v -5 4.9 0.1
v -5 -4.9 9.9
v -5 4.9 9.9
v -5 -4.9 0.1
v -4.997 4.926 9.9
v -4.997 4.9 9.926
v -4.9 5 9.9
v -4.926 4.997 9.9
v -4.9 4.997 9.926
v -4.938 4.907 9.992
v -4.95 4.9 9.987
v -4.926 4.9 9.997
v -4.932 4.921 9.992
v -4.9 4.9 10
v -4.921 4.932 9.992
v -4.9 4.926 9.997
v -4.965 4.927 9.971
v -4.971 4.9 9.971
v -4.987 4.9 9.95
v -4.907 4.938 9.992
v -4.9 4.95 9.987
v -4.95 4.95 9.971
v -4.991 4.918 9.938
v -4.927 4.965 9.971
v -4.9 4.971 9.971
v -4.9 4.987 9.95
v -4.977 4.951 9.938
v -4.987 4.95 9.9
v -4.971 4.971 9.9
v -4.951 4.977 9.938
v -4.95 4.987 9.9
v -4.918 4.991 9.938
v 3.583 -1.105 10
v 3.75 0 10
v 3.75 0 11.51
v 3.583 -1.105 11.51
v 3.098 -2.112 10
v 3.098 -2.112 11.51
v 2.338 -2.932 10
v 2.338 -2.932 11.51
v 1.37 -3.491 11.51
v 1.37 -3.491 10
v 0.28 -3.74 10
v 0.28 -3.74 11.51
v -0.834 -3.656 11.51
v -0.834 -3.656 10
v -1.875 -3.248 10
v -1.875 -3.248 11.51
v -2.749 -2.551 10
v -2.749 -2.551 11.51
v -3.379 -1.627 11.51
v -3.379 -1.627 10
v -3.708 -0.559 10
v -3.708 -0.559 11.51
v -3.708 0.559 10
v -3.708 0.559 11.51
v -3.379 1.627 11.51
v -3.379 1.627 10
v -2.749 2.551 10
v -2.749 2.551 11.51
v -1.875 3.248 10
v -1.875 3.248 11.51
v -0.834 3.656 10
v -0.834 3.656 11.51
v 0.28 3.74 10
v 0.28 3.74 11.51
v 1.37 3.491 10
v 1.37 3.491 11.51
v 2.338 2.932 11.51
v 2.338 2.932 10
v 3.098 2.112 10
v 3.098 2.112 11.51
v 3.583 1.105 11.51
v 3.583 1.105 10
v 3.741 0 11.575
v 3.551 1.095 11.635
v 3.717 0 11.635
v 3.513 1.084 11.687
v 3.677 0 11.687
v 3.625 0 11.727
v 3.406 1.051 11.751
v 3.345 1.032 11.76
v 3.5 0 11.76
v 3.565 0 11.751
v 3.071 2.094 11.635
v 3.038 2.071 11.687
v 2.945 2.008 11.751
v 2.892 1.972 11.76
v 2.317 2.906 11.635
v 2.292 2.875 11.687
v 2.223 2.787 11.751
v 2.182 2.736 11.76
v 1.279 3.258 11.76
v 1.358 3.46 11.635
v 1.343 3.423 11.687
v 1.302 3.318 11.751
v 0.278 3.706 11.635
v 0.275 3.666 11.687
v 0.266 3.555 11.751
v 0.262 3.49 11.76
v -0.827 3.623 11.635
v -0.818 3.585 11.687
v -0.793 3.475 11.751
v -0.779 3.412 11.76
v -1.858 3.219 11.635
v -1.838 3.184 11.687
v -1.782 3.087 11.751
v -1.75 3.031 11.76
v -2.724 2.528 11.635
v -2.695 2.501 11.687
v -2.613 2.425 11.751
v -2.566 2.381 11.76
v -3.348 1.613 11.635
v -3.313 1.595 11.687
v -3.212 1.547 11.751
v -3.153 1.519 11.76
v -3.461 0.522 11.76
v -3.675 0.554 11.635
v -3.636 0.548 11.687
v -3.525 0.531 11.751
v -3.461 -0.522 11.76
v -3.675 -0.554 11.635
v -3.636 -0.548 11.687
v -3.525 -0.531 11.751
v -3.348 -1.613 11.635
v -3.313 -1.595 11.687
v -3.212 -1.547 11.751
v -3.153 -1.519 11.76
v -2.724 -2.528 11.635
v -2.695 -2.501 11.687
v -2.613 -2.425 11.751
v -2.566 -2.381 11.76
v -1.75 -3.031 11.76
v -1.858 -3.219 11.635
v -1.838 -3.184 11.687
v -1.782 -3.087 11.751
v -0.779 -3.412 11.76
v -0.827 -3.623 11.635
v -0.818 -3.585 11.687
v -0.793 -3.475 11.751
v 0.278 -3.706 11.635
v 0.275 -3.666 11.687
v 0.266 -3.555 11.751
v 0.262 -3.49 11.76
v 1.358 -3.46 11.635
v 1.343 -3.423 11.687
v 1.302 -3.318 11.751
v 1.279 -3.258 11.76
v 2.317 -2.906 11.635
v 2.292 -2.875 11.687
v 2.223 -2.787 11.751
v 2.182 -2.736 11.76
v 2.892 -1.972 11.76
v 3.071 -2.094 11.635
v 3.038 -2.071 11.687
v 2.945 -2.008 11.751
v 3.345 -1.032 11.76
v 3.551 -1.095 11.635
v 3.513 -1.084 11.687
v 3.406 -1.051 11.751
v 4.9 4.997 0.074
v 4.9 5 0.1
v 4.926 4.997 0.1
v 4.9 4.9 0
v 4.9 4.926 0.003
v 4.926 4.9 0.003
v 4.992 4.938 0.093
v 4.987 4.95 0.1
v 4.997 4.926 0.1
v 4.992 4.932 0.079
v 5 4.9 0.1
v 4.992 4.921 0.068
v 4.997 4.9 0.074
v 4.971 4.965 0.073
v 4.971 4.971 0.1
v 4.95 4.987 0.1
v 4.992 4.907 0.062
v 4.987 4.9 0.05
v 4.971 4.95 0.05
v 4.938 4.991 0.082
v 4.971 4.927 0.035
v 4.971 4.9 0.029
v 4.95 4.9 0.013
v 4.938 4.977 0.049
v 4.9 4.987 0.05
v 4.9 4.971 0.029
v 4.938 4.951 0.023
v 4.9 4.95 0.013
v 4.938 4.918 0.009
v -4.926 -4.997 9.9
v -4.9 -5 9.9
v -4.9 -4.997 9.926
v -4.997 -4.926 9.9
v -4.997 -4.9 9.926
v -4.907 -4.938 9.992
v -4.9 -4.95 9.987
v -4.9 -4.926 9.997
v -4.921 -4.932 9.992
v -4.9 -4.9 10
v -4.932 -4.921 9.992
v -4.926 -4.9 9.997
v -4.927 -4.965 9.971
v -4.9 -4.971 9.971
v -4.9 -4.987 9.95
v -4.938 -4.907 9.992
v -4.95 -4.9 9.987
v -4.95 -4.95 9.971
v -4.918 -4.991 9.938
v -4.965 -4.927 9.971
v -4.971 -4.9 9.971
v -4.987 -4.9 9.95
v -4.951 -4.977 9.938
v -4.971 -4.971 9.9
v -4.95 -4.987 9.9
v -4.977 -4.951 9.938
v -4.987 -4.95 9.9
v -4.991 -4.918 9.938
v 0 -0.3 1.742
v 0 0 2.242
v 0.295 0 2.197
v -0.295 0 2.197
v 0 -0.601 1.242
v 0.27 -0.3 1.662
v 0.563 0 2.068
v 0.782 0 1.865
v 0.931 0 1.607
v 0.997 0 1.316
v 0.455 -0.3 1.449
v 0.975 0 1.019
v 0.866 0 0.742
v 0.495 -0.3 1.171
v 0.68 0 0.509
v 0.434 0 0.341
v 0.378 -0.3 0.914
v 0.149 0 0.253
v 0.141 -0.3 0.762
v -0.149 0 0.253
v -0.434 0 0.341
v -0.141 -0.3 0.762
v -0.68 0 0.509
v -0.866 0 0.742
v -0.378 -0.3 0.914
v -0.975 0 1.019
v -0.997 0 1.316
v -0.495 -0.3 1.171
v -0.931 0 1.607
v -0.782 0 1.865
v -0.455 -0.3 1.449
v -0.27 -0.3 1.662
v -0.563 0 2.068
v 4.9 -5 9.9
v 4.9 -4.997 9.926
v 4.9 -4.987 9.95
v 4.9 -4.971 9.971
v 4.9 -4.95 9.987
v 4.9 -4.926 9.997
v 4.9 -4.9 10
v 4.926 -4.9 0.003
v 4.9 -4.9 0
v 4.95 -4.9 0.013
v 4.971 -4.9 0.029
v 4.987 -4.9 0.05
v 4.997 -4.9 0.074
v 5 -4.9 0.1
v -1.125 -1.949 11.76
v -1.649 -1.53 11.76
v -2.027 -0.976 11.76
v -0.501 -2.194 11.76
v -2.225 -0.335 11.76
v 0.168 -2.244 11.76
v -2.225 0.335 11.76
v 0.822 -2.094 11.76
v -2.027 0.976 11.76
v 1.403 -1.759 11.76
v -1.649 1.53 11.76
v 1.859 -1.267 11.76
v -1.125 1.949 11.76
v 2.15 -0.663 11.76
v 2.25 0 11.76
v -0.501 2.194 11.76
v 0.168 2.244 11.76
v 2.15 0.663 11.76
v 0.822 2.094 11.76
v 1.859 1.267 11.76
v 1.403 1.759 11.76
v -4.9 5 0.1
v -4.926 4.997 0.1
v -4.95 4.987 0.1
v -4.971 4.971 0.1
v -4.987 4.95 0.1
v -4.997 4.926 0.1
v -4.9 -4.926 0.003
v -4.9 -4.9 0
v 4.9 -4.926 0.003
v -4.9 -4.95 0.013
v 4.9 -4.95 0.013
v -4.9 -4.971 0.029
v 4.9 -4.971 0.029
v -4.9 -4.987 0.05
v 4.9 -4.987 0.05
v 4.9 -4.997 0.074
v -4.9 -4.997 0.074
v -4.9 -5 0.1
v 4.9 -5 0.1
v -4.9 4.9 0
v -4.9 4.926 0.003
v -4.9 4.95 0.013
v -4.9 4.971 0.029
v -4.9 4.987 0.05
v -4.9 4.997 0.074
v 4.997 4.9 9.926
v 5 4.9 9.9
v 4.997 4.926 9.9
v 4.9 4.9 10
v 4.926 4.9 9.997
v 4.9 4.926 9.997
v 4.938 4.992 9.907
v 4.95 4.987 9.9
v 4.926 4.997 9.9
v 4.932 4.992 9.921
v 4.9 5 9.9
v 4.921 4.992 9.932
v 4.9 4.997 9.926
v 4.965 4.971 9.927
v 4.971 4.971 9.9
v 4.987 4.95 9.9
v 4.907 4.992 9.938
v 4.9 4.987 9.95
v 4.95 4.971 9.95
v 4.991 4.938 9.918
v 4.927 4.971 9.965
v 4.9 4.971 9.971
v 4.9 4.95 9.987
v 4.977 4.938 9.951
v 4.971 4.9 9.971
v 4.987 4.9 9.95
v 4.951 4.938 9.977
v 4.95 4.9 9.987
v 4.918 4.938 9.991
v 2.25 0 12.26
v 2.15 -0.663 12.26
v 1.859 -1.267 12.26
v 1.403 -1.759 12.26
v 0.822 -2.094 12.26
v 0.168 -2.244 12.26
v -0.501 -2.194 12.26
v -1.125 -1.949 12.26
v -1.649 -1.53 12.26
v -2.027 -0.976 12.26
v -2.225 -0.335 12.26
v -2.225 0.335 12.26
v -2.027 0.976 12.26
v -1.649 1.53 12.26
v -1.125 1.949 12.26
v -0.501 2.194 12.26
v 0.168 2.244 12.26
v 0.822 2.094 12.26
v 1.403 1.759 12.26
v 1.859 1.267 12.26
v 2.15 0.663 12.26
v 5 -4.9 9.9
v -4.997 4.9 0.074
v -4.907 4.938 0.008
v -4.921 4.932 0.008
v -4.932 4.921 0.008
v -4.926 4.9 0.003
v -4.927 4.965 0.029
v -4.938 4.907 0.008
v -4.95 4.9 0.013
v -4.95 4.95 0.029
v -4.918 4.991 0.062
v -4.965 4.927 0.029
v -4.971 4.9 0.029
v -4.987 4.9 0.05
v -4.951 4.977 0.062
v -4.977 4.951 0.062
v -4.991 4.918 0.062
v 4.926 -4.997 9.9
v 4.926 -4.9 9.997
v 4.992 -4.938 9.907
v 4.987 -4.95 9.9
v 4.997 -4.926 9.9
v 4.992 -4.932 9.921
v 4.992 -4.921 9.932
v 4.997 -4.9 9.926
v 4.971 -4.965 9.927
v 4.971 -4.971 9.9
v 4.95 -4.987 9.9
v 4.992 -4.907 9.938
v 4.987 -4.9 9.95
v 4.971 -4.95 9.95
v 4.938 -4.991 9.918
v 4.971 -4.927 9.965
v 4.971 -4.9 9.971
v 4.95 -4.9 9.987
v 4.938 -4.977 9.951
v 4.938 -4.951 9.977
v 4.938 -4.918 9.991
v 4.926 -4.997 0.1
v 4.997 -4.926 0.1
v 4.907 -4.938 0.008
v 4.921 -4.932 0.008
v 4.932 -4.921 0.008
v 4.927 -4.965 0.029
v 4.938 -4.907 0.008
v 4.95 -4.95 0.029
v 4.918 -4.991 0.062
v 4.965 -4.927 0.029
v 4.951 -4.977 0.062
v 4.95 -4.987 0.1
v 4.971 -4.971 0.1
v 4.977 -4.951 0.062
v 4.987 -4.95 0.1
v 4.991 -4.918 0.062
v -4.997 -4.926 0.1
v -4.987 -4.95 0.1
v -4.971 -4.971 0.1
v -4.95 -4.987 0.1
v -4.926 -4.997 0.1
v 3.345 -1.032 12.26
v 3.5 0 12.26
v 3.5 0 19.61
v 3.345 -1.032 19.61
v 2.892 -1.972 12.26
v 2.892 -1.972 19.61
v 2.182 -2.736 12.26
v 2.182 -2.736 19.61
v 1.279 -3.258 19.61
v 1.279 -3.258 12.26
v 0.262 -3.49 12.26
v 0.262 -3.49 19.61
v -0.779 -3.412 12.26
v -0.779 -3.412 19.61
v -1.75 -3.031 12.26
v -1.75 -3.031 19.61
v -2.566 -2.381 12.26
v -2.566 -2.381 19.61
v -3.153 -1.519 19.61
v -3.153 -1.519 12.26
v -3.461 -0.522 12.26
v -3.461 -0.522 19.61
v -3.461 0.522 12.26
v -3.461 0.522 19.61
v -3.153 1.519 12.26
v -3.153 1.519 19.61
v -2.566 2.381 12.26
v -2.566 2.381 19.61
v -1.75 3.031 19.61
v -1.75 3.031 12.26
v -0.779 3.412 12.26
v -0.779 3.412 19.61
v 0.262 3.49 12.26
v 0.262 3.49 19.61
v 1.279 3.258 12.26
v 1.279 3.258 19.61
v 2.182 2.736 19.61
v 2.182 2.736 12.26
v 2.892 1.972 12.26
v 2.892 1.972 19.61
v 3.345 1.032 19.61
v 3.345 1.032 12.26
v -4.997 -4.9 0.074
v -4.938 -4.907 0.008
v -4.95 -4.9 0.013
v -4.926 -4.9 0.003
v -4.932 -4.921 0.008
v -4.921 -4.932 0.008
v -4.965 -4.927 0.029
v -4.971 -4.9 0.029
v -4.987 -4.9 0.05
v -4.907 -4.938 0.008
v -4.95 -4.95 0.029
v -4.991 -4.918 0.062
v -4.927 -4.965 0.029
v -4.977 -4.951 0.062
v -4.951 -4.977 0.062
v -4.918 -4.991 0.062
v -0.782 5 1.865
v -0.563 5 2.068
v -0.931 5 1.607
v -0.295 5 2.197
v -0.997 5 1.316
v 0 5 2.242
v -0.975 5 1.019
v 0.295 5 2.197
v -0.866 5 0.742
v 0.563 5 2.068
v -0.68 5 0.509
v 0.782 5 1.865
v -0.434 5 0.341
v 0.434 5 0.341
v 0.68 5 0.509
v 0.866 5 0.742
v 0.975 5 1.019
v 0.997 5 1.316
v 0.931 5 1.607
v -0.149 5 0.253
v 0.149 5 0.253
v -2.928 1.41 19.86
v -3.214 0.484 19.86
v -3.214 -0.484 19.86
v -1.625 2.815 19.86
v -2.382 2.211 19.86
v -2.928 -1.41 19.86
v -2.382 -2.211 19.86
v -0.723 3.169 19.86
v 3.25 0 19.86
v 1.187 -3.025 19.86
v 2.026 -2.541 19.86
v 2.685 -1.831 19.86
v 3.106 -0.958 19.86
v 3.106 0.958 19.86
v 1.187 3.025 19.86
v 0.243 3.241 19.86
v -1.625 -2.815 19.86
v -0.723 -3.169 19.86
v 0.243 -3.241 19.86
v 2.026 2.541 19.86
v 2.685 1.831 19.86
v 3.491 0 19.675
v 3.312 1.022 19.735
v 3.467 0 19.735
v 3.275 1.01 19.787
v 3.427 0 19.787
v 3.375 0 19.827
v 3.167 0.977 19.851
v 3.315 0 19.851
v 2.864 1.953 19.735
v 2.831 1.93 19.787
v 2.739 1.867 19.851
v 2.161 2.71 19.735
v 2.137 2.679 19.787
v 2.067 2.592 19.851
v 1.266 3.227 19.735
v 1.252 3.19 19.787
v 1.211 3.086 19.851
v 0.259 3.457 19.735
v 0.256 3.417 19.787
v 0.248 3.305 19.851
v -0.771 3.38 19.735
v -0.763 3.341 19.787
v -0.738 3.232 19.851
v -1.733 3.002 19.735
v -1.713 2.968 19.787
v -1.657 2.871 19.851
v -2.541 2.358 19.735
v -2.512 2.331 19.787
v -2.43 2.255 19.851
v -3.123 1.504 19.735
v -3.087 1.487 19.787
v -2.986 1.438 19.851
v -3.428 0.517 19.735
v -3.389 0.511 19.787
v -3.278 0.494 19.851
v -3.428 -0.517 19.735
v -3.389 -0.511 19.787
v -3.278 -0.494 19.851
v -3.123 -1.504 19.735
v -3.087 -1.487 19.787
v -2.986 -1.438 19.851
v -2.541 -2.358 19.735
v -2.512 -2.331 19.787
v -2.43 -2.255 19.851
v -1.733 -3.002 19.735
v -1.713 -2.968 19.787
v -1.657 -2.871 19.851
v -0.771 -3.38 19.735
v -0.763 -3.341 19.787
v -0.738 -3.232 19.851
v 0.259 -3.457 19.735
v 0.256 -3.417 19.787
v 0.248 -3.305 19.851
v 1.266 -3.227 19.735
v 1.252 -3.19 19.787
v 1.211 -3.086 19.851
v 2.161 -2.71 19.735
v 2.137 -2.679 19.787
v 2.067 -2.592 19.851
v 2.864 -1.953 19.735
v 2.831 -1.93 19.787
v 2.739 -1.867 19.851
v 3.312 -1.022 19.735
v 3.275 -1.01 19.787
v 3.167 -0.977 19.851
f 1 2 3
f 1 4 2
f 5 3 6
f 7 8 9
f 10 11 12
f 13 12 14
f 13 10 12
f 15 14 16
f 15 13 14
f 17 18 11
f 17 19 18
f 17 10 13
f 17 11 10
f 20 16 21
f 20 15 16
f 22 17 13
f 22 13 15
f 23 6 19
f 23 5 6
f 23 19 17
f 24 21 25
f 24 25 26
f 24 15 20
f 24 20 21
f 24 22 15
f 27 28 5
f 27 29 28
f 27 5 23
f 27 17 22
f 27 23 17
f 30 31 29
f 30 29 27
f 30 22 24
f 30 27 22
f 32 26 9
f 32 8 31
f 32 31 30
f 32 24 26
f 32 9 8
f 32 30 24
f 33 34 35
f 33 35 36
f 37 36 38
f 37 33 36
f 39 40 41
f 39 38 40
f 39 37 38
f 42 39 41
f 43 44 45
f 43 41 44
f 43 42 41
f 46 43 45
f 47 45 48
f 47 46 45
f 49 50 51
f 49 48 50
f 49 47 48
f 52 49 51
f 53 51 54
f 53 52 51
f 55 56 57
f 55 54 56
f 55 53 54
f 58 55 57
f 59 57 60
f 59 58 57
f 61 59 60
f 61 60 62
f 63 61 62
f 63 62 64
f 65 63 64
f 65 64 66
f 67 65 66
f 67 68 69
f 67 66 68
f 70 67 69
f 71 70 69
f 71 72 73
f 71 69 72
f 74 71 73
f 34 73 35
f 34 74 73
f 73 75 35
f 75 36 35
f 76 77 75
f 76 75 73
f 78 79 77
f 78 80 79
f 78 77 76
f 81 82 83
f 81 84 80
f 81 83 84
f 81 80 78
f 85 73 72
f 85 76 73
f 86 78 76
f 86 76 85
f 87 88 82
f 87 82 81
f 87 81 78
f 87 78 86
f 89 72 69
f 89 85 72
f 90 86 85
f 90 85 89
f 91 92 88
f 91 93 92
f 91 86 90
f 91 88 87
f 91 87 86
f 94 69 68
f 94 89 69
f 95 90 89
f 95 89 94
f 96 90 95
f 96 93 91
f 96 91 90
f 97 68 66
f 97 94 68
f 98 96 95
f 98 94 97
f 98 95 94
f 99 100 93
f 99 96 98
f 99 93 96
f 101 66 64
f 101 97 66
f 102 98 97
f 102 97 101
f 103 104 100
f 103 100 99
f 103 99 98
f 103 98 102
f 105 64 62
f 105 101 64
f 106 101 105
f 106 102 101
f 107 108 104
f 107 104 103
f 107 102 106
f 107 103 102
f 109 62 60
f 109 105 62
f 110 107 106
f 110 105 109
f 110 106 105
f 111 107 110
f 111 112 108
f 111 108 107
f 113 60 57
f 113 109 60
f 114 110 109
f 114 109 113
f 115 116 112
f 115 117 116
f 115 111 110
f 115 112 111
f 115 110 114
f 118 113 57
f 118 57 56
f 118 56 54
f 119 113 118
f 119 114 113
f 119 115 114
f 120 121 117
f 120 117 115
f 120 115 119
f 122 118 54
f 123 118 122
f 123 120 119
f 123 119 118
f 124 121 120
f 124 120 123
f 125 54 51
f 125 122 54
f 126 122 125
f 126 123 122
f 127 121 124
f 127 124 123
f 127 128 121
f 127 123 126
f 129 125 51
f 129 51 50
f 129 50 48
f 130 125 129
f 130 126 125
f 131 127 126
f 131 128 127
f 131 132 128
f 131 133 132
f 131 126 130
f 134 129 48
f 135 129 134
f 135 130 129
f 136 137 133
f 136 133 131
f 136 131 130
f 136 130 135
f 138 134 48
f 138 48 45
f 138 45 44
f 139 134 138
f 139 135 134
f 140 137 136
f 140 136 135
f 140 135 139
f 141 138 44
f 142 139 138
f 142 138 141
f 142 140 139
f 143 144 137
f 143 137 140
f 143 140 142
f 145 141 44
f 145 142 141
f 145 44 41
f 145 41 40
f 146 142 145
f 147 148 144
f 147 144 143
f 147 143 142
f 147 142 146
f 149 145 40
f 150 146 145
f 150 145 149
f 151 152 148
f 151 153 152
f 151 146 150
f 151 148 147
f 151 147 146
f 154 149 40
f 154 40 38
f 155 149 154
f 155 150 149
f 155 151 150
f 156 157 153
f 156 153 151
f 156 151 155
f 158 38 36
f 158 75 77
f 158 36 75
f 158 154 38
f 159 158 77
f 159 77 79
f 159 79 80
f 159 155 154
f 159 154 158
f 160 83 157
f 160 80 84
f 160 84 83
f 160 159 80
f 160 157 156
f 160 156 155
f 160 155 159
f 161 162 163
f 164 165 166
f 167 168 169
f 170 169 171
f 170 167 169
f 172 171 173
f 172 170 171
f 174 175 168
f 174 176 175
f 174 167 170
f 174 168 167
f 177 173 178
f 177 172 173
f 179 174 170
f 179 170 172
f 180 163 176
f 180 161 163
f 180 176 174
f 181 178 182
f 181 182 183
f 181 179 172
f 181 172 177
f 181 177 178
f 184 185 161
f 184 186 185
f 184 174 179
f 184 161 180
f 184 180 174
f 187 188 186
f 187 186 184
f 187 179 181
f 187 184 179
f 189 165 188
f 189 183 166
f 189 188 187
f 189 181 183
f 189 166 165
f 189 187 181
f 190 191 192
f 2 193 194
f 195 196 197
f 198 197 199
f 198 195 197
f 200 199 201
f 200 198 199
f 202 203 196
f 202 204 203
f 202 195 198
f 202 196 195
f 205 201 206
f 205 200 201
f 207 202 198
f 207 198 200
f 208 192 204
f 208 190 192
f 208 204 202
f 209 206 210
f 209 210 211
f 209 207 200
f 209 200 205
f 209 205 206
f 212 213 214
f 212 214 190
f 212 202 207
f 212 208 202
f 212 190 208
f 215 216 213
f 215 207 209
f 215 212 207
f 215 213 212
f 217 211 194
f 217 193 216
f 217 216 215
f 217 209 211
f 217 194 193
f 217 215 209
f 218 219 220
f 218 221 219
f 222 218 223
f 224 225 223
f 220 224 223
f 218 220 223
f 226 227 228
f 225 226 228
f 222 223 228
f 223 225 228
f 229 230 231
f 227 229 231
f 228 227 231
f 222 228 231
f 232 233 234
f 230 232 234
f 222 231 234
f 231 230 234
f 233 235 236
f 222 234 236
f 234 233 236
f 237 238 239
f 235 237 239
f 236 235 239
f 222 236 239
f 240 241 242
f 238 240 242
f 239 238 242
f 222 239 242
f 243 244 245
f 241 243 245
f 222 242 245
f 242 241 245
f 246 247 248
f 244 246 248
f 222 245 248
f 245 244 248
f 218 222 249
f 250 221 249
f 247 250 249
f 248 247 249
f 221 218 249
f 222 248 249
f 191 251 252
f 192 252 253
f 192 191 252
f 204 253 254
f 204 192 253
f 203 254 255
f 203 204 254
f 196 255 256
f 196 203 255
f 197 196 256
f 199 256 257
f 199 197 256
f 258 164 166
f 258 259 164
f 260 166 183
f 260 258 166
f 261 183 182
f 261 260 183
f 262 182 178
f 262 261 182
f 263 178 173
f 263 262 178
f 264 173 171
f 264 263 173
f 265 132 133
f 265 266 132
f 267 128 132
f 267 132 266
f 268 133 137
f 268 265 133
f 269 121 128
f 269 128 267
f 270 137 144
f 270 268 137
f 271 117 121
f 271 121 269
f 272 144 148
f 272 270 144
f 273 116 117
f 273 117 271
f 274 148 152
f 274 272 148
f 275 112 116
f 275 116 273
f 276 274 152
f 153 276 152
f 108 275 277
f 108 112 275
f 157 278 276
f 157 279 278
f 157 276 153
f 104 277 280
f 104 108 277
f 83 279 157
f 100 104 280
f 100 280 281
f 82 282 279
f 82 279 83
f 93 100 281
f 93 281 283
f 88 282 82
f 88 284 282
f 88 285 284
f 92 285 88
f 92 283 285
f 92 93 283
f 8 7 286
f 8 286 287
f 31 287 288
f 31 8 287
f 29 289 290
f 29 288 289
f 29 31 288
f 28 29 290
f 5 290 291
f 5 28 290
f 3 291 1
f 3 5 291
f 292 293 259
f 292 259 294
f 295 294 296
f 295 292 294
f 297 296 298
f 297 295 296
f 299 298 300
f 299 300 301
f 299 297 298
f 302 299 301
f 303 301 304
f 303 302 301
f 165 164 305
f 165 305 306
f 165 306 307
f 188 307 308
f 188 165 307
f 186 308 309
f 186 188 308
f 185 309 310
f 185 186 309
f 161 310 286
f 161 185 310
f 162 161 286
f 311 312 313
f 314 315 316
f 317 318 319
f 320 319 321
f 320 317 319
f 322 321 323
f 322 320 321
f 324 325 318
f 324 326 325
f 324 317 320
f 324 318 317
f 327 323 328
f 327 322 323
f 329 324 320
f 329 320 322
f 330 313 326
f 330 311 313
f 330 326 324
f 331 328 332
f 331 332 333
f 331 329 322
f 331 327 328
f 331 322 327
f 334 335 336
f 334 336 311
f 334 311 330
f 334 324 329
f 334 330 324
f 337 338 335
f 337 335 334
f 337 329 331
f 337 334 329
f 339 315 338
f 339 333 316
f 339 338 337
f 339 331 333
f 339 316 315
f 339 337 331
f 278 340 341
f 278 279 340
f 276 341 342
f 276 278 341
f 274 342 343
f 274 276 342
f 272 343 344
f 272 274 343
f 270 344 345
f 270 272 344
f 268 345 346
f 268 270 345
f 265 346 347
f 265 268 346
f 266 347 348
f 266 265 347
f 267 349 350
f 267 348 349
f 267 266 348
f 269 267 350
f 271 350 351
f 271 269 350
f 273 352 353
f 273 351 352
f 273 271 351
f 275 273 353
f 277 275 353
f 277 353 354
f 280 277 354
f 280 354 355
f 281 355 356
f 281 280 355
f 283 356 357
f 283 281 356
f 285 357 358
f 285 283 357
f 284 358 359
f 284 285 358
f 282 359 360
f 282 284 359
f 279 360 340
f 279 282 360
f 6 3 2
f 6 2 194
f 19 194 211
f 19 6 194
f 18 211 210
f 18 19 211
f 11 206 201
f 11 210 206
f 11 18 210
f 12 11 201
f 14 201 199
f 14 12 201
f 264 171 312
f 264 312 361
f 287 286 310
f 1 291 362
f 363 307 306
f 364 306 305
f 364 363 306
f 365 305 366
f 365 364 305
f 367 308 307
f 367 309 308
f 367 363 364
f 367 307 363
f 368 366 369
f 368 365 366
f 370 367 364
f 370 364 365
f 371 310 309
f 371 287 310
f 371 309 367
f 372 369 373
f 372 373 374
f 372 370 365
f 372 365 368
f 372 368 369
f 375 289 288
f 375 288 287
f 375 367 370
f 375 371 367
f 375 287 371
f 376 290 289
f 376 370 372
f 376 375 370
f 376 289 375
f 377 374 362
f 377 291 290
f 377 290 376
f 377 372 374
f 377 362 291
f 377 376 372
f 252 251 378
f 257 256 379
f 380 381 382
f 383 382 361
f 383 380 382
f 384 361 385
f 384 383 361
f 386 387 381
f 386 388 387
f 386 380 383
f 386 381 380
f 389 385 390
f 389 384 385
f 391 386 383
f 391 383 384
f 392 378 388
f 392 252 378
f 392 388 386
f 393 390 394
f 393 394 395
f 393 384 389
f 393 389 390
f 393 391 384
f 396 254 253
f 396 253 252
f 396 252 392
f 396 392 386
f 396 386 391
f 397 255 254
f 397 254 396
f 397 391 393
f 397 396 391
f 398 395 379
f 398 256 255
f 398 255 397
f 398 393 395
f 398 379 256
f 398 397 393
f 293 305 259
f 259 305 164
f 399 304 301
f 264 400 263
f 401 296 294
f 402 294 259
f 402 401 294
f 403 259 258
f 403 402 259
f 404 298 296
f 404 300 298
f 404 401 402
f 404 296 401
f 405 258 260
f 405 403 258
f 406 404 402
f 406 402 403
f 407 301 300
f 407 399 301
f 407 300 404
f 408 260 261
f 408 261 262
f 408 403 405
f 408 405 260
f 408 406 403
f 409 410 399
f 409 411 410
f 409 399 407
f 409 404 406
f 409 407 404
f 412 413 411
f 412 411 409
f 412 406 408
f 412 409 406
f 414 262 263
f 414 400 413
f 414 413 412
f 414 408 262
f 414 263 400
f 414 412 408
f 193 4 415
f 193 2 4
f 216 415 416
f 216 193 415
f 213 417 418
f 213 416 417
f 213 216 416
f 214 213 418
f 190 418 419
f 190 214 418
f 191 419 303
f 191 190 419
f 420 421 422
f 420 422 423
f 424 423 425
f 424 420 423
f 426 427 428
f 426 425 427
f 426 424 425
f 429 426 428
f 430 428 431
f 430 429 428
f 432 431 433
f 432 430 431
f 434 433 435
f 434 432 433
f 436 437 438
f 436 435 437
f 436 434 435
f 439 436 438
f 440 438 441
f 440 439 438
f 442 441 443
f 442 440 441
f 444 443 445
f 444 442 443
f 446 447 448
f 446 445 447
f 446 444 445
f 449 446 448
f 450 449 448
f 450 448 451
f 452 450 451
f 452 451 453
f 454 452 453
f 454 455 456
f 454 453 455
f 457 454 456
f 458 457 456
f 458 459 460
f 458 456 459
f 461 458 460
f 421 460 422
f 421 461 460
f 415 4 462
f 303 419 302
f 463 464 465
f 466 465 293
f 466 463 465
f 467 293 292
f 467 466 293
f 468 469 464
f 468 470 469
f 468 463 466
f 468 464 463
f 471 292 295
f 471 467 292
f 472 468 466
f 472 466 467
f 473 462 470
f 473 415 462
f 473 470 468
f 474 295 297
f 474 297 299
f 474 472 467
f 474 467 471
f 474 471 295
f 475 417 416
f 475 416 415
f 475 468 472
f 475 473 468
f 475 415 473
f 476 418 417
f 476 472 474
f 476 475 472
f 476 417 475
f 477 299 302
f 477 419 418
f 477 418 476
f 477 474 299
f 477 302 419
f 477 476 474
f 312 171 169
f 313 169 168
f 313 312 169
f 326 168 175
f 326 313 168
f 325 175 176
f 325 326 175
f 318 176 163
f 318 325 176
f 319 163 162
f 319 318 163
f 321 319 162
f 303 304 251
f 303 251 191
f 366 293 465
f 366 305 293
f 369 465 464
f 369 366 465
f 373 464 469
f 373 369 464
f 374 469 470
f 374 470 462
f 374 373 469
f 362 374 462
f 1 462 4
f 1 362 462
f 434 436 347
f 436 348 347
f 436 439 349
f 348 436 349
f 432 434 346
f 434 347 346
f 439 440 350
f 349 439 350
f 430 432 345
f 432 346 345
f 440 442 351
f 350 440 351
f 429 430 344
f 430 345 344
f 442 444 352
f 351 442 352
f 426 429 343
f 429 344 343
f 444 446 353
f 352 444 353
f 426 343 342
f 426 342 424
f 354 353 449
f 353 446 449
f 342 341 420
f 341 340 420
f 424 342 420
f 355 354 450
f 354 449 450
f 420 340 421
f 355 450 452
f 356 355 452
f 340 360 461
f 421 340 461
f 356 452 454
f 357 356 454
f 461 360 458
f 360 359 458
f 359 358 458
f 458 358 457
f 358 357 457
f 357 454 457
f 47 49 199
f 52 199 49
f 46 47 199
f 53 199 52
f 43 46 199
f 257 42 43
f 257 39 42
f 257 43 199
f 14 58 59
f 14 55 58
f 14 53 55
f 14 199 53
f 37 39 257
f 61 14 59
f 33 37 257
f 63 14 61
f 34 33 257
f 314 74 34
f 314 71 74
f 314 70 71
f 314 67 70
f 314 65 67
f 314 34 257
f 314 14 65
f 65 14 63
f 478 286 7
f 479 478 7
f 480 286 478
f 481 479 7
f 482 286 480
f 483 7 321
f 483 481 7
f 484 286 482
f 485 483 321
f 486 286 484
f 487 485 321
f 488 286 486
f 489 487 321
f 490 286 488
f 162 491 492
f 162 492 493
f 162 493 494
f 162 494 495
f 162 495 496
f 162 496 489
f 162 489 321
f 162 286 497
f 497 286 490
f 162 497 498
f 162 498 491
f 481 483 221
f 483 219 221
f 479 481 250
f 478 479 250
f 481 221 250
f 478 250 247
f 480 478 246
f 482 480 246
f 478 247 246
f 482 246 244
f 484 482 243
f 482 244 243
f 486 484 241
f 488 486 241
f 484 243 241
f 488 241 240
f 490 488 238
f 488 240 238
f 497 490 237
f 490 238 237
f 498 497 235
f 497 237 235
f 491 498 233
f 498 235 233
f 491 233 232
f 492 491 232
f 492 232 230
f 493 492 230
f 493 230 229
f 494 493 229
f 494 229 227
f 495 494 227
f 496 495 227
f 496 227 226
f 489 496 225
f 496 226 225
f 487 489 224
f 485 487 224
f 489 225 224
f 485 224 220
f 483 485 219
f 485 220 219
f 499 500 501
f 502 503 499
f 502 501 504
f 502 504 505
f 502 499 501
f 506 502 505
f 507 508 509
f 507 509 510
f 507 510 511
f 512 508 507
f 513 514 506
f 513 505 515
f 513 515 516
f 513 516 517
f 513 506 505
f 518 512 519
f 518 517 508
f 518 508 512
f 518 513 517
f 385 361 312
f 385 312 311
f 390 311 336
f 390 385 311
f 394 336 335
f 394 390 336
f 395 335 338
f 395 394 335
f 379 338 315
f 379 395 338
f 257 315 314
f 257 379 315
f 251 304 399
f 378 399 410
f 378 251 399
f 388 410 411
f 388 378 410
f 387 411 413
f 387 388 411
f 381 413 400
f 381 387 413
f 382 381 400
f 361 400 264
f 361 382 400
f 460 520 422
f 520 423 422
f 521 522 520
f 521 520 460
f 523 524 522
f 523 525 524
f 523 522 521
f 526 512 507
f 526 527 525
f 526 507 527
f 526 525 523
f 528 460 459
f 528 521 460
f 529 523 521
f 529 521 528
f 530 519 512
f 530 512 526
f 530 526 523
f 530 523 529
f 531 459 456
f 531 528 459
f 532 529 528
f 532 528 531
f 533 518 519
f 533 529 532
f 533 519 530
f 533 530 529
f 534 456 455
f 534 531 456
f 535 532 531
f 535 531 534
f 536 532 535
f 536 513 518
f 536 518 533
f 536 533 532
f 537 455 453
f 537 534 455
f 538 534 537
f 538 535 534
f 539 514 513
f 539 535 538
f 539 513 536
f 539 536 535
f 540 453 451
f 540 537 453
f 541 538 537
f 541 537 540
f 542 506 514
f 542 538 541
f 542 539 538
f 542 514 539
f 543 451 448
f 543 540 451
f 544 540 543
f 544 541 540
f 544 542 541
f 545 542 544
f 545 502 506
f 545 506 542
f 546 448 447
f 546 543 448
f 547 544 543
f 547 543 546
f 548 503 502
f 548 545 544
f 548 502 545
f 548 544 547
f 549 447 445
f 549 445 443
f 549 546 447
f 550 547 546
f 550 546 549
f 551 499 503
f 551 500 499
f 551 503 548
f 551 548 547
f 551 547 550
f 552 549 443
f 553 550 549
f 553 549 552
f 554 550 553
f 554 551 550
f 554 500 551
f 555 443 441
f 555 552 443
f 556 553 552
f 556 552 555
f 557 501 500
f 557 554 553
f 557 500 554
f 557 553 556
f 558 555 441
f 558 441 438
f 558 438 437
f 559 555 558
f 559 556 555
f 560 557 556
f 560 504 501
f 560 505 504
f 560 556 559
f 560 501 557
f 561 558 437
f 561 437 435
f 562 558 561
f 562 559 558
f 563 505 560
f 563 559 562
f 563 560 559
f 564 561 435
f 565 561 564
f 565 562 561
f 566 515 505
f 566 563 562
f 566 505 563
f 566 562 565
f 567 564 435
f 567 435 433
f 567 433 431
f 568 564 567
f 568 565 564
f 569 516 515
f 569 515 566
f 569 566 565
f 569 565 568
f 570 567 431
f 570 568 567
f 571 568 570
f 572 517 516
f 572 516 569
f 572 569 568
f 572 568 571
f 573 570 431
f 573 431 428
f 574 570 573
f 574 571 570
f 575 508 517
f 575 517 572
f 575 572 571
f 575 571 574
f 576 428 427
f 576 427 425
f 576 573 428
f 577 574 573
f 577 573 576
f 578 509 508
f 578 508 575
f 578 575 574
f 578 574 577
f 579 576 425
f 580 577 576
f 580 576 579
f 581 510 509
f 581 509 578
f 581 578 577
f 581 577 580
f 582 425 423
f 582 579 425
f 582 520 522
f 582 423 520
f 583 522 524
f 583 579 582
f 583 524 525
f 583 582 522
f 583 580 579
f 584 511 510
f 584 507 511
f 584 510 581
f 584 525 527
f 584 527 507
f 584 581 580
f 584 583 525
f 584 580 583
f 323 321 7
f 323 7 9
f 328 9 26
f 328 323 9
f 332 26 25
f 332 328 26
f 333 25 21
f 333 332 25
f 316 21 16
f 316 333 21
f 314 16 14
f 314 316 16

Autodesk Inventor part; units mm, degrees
ref_plane "YZ Plane" through (0, 0, 0) normal (1, 0, 0) x (0, 1, 0)
ref_plane "XZ Plane" through (0, 0, 0) normal (0, 1, 0) x (-1, 0, 0)
ref_plane "XY Plane" through (0, 0, 0) normal (0, 0, 1) x (1, 0, 0)
sketch "Skizze1" plane through (0, 0, 0) normal (0, 0, 1) x (1, 0, 0)
  line L0 (-5, 5) -> (5, 5)
  line L1 (5, 5) -> (5, -5)
  line L2 (5, -5) -> (-5, -5)
  line L3 (-5, -5) -> (-5, 5)
  point P0 (0, 0)
  point P1 (5, 0)
  point P2 (0, -5)
  dimension "d0" = 10
  dimension "d1" = 10
extrude "Extrusion1" add sketch "Skizze1" along normal blind 10
sketch "Skizze2" plane through (0, 0, 10) normal (0, 0, 1) x (1, 0, 0)
  circle A0 centre (0, 0) radius 3.75
  dimension "d4" = 7.5
extrude "Extrusion2" add sketch "Skizze2" along normal blind 1.76
fillet "Rundung1" radius 0.25 1 edges at (-3.75, 0, 11.76)
sketch "Skizze3" plane through (0, 0, 11.76) normal (0, 0, 1) x (1, 0, 0)
  circle A0 centre (0, 0) radius 3.5 projected
  circle A1 centre (0, 0) radius 2.25
  dimension "d8" = 4.5
extrude "Extrusion3" add sketch "Skizze3" along normal blind 0.5 contours A1
sketch "Skizze4" plane through (0, 0, 12.26) normal (0, 0, 1) x (1, 0, 0)
  circle A0 centre (0, 0) radius 2.25 projected
  circle A1 centre (0, 0) radius 3.5
  dimension "d11" = 7
extrude "Extrusion4" add sketch "Skizze4" along normal blind 7.6 contours A0 | A1
fillet "Rundung2" radius 0.25 1 edges at (-3.5, 0, 19.86)
fillet "Rundung3" radius 0.1 12 edges at (-5, -5, 5) (-5, 5, 5) (-5, 0, 10) (0, -5, 10) (5, 0, 10) (5, -5, 5) (0, -5, 0) (-5, 0, 0) (0, 5, 0) (0, 5, 10) (5, 5, 5) (5, 0, 0)
sketch "Skizze5" plane through (-4.9, 5, 0.1) normal (0, 1, 0) x (1, 0, 0)
  point P0 (4.9, 0.1)
  point P1 (4.9, -1.1417)
hole "Hole2" at (0, 5, 1.2417) direction (0, -1, 0) diameter 2 depth 5 tip angle 118
properties part number "Taster"
